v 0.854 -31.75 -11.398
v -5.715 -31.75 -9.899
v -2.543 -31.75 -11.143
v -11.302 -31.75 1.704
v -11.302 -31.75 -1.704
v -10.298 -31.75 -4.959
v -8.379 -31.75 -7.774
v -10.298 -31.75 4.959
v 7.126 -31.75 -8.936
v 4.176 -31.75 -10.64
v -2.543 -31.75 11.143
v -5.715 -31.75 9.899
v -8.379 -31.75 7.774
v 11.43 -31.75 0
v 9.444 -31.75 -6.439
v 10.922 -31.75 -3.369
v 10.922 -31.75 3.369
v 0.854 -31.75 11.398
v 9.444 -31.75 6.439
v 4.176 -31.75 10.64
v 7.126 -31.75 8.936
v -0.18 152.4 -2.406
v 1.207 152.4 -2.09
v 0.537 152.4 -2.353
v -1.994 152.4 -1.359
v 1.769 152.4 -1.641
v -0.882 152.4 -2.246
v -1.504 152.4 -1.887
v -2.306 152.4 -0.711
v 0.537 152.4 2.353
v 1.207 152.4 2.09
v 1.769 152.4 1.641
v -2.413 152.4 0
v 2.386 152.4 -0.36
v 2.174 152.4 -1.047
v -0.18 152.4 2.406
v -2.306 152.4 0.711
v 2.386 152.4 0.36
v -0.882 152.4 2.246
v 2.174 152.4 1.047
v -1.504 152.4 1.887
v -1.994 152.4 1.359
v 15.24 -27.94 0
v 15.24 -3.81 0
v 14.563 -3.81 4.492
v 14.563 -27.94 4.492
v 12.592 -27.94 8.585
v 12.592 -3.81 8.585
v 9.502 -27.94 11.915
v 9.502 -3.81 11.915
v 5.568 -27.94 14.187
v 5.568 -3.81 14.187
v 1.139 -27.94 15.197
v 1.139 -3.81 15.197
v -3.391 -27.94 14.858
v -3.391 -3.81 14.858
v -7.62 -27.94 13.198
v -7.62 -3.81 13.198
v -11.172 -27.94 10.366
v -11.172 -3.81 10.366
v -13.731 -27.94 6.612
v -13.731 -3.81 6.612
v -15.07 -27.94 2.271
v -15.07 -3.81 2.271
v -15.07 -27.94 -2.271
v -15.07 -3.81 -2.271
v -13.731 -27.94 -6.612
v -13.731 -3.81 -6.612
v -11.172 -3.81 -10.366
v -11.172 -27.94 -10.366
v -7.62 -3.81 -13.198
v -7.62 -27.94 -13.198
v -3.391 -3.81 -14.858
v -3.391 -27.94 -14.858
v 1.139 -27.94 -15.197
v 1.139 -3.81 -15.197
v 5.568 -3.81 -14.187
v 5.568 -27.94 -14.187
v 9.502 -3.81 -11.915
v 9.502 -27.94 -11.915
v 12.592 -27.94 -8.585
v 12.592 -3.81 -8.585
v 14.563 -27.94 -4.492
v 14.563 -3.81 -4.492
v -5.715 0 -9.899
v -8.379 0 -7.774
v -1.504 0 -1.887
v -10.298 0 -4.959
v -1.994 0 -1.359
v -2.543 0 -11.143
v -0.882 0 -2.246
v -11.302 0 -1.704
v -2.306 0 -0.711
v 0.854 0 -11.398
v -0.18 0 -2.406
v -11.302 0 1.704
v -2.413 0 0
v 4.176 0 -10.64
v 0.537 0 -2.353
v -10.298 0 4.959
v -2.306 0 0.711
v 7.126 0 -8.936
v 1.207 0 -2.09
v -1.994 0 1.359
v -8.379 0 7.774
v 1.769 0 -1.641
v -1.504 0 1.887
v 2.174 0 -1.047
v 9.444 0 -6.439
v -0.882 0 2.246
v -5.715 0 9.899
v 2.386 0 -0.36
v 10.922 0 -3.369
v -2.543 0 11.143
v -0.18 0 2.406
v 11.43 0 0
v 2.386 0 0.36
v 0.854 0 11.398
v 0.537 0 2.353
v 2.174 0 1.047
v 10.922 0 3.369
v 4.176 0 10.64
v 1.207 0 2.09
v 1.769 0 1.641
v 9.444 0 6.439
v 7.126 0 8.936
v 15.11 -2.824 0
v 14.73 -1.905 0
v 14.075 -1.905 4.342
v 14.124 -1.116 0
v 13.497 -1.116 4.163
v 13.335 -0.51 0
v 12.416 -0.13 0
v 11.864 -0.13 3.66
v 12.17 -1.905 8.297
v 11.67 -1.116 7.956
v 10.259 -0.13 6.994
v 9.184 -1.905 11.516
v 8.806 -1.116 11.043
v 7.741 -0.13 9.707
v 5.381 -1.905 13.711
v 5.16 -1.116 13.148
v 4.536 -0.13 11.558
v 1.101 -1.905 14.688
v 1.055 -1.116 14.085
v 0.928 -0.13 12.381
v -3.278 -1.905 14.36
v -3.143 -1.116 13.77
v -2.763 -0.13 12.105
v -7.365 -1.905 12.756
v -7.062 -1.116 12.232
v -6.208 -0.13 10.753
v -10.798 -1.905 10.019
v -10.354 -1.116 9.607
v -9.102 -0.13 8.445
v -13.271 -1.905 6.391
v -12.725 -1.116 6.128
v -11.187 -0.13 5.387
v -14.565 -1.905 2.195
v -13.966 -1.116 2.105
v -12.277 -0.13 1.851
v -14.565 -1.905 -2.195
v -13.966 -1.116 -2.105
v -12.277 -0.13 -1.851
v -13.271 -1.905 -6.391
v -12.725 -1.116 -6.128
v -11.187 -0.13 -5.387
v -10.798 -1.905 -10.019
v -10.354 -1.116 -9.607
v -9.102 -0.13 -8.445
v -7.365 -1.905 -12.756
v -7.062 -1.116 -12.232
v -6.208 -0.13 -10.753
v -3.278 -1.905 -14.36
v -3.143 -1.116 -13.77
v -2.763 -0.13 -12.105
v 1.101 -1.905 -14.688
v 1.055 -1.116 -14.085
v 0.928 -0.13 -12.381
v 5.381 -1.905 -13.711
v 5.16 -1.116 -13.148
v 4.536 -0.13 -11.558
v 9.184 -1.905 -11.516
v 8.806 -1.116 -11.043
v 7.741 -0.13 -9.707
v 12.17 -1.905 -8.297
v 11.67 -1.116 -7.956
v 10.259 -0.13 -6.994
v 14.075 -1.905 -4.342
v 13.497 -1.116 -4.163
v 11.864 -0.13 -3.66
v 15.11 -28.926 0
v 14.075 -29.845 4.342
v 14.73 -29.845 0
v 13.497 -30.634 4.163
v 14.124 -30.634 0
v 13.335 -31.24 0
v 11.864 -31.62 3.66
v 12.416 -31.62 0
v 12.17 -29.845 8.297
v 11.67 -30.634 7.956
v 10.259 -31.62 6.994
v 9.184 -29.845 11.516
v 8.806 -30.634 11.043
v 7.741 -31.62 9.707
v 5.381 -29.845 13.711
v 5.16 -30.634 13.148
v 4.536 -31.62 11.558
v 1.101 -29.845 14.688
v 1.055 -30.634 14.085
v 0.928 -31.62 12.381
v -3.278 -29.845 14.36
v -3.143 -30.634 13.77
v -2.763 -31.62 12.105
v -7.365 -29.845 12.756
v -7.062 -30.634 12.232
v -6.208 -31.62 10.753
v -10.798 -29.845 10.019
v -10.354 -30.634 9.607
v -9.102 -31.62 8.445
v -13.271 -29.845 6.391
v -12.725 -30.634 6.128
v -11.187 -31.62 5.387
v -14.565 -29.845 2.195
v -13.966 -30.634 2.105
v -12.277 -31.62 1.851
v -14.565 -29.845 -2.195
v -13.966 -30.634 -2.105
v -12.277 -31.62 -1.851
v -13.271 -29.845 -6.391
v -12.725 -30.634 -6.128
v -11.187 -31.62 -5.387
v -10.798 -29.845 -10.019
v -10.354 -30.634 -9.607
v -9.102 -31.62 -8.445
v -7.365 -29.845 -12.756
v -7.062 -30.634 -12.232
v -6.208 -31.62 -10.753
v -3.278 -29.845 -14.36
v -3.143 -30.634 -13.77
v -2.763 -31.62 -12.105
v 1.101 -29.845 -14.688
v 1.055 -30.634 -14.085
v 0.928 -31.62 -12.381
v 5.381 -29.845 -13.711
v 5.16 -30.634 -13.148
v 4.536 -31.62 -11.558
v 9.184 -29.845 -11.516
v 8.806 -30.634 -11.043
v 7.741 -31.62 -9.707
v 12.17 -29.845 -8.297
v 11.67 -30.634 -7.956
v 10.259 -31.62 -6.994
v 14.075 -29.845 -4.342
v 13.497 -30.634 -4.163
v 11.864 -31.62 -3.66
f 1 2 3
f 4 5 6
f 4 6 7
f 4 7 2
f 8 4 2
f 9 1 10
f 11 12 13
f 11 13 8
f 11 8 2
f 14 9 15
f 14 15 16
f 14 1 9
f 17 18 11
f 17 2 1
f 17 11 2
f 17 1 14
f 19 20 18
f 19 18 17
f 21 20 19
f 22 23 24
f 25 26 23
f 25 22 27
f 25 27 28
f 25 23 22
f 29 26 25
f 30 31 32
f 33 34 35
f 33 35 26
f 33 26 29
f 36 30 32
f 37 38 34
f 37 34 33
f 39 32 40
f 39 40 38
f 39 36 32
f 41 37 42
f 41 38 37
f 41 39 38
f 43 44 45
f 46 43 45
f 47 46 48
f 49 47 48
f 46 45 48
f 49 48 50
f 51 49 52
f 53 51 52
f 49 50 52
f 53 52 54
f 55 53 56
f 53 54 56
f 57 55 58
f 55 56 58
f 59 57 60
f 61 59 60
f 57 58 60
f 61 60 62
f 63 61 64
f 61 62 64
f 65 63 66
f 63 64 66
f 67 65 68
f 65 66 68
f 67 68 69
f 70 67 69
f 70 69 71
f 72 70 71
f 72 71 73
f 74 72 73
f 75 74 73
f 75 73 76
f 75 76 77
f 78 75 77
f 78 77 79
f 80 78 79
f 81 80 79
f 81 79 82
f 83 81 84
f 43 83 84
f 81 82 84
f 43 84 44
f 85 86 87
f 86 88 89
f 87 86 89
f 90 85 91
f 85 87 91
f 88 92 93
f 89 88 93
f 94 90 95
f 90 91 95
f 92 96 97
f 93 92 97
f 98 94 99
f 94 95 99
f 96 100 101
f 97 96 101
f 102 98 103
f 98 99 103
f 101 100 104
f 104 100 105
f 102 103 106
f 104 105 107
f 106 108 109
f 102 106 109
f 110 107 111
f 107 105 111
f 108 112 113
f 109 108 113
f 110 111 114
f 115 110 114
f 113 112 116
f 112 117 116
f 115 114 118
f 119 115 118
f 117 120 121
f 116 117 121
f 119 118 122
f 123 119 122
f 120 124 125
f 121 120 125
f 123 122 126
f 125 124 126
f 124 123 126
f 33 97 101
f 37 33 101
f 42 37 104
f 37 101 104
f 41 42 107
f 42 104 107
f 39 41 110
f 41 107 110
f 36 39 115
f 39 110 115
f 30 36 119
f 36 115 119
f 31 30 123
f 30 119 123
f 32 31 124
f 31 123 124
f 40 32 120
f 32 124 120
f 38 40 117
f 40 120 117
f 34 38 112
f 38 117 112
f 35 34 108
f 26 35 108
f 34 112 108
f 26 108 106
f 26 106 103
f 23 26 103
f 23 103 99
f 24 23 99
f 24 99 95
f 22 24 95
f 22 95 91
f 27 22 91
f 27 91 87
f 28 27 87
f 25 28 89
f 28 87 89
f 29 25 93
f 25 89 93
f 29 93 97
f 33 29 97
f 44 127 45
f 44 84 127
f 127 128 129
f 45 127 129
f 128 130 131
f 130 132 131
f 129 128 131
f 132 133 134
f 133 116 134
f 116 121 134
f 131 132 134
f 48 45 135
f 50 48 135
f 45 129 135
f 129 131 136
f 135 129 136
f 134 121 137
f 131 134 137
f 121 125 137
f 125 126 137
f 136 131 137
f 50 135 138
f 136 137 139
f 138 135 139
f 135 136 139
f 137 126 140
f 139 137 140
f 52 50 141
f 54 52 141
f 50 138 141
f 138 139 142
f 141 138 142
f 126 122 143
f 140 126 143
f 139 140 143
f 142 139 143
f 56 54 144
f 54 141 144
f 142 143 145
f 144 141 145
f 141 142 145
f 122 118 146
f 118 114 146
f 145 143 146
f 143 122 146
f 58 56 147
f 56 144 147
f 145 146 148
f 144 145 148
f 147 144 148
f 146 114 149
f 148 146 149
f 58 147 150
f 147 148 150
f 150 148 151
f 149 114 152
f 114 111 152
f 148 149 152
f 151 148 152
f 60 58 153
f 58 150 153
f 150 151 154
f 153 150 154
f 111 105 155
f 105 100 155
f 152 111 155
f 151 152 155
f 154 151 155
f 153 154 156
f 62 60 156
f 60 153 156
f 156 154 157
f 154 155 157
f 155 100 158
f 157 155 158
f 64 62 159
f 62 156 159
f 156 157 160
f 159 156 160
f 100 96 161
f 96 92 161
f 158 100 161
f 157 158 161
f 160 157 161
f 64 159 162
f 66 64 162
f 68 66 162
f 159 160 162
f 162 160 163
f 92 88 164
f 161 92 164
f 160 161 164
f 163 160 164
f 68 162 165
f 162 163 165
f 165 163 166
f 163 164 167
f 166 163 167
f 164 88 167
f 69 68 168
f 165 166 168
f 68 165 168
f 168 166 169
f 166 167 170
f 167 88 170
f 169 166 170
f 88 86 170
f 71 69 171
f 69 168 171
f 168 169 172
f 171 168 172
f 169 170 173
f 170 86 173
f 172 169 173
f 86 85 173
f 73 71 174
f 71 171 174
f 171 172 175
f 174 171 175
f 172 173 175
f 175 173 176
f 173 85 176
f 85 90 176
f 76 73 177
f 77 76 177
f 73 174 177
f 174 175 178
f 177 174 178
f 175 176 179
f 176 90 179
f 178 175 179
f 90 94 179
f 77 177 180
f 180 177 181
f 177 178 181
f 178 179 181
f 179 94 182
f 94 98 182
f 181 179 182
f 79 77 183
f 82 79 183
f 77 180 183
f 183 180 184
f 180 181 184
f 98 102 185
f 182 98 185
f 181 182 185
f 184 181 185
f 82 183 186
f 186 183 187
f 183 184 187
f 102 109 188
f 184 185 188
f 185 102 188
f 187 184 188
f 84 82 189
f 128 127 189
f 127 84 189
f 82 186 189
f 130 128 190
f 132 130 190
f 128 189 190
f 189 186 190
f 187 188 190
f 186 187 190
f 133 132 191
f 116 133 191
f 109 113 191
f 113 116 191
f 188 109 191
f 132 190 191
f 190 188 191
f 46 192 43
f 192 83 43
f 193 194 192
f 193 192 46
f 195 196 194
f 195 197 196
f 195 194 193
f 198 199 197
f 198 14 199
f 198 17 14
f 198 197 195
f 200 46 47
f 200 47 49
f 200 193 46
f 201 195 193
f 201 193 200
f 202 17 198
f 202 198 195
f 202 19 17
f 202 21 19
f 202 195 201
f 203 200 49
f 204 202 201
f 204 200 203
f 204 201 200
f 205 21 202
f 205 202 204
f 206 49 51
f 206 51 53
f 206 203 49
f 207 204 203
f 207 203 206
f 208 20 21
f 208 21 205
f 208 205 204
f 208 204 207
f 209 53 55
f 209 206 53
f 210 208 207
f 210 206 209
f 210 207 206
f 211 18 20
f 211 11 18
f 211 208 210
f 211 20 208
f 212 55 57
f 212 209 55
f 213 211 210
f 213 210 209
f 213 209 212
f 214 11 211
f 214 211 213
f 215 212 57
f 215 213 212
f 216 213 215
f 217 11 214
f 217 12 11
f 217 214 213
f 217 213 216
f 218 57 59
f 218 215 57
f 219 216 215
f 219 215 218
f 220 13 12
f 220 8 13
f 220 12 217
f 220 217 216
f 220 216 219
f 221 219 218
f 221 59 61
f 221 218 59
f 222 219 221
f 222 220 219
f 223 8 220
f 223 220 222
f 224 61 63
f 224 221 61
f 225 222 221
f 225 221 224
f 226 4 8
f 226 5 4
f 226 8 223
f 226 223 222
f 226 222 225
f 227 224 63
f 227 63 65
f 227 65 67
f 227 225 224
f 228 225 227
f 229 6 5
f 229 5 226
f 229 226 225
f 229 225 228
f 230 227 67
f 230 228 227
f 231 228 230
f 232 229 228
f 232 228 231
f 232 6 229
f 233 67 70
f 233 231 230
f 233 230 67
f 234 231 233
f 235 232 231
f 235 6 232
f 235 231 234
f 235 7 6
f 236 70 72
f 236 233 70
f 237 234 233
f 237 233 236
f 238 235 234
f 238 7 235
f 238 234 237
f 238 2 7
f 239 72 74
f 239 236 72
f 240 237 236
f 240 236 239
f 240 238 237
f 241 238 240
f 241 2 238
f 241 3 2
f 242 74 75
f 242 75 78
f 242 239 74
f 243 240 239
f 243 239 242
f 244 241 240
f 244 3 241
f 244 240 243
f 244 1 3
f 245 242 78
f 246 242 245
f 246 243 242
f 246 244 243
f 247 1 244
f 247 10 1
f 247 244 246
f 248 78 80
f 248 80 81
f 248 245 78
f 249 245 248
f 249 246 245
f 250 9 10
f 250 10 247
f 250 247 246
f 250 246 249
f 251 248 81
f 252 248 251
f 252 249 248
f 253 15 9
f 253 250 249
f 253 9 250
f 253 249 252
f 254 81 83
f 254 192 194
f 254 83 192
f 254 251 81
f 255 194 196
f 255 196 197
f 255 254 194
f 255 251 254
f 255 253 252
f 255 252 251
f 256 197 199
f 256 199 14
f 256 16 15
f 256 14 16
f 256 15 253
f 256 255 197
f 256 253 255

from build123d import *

# Parameters (mm, degrees)
F0_R     = 15.24
F1_DEPTH = 31.75
F2_R     = 3.81
F3_R     = 2.413
F4_DEPTH = 152.4


with BuildPart() as f1:
    # F0 (on Front) → F1 (new body)
    with BuildSketch(Plane.XZ):
        Circle(F0_R)
    extrude(amount=F1_DEPTH)

    # F2
    f2_edges = [f1.edges().sort_by_distance(p)[0] for p in [
        (-15.24, -31.75, 0),
        (-15.24, 0, 0),
    ]]
    fillet(f2_edges, radius=F2_R)

    # F3 (on face) → F4 (join)
    with BuildSketch(Plane(origin=(0, 0, 0), x_dir=(-1, 0, 0), z_dir=(0, 1, 0))):
        Circle(F3_R)
    extrude(amount=F4_DEPTH)


solid = f1.part
